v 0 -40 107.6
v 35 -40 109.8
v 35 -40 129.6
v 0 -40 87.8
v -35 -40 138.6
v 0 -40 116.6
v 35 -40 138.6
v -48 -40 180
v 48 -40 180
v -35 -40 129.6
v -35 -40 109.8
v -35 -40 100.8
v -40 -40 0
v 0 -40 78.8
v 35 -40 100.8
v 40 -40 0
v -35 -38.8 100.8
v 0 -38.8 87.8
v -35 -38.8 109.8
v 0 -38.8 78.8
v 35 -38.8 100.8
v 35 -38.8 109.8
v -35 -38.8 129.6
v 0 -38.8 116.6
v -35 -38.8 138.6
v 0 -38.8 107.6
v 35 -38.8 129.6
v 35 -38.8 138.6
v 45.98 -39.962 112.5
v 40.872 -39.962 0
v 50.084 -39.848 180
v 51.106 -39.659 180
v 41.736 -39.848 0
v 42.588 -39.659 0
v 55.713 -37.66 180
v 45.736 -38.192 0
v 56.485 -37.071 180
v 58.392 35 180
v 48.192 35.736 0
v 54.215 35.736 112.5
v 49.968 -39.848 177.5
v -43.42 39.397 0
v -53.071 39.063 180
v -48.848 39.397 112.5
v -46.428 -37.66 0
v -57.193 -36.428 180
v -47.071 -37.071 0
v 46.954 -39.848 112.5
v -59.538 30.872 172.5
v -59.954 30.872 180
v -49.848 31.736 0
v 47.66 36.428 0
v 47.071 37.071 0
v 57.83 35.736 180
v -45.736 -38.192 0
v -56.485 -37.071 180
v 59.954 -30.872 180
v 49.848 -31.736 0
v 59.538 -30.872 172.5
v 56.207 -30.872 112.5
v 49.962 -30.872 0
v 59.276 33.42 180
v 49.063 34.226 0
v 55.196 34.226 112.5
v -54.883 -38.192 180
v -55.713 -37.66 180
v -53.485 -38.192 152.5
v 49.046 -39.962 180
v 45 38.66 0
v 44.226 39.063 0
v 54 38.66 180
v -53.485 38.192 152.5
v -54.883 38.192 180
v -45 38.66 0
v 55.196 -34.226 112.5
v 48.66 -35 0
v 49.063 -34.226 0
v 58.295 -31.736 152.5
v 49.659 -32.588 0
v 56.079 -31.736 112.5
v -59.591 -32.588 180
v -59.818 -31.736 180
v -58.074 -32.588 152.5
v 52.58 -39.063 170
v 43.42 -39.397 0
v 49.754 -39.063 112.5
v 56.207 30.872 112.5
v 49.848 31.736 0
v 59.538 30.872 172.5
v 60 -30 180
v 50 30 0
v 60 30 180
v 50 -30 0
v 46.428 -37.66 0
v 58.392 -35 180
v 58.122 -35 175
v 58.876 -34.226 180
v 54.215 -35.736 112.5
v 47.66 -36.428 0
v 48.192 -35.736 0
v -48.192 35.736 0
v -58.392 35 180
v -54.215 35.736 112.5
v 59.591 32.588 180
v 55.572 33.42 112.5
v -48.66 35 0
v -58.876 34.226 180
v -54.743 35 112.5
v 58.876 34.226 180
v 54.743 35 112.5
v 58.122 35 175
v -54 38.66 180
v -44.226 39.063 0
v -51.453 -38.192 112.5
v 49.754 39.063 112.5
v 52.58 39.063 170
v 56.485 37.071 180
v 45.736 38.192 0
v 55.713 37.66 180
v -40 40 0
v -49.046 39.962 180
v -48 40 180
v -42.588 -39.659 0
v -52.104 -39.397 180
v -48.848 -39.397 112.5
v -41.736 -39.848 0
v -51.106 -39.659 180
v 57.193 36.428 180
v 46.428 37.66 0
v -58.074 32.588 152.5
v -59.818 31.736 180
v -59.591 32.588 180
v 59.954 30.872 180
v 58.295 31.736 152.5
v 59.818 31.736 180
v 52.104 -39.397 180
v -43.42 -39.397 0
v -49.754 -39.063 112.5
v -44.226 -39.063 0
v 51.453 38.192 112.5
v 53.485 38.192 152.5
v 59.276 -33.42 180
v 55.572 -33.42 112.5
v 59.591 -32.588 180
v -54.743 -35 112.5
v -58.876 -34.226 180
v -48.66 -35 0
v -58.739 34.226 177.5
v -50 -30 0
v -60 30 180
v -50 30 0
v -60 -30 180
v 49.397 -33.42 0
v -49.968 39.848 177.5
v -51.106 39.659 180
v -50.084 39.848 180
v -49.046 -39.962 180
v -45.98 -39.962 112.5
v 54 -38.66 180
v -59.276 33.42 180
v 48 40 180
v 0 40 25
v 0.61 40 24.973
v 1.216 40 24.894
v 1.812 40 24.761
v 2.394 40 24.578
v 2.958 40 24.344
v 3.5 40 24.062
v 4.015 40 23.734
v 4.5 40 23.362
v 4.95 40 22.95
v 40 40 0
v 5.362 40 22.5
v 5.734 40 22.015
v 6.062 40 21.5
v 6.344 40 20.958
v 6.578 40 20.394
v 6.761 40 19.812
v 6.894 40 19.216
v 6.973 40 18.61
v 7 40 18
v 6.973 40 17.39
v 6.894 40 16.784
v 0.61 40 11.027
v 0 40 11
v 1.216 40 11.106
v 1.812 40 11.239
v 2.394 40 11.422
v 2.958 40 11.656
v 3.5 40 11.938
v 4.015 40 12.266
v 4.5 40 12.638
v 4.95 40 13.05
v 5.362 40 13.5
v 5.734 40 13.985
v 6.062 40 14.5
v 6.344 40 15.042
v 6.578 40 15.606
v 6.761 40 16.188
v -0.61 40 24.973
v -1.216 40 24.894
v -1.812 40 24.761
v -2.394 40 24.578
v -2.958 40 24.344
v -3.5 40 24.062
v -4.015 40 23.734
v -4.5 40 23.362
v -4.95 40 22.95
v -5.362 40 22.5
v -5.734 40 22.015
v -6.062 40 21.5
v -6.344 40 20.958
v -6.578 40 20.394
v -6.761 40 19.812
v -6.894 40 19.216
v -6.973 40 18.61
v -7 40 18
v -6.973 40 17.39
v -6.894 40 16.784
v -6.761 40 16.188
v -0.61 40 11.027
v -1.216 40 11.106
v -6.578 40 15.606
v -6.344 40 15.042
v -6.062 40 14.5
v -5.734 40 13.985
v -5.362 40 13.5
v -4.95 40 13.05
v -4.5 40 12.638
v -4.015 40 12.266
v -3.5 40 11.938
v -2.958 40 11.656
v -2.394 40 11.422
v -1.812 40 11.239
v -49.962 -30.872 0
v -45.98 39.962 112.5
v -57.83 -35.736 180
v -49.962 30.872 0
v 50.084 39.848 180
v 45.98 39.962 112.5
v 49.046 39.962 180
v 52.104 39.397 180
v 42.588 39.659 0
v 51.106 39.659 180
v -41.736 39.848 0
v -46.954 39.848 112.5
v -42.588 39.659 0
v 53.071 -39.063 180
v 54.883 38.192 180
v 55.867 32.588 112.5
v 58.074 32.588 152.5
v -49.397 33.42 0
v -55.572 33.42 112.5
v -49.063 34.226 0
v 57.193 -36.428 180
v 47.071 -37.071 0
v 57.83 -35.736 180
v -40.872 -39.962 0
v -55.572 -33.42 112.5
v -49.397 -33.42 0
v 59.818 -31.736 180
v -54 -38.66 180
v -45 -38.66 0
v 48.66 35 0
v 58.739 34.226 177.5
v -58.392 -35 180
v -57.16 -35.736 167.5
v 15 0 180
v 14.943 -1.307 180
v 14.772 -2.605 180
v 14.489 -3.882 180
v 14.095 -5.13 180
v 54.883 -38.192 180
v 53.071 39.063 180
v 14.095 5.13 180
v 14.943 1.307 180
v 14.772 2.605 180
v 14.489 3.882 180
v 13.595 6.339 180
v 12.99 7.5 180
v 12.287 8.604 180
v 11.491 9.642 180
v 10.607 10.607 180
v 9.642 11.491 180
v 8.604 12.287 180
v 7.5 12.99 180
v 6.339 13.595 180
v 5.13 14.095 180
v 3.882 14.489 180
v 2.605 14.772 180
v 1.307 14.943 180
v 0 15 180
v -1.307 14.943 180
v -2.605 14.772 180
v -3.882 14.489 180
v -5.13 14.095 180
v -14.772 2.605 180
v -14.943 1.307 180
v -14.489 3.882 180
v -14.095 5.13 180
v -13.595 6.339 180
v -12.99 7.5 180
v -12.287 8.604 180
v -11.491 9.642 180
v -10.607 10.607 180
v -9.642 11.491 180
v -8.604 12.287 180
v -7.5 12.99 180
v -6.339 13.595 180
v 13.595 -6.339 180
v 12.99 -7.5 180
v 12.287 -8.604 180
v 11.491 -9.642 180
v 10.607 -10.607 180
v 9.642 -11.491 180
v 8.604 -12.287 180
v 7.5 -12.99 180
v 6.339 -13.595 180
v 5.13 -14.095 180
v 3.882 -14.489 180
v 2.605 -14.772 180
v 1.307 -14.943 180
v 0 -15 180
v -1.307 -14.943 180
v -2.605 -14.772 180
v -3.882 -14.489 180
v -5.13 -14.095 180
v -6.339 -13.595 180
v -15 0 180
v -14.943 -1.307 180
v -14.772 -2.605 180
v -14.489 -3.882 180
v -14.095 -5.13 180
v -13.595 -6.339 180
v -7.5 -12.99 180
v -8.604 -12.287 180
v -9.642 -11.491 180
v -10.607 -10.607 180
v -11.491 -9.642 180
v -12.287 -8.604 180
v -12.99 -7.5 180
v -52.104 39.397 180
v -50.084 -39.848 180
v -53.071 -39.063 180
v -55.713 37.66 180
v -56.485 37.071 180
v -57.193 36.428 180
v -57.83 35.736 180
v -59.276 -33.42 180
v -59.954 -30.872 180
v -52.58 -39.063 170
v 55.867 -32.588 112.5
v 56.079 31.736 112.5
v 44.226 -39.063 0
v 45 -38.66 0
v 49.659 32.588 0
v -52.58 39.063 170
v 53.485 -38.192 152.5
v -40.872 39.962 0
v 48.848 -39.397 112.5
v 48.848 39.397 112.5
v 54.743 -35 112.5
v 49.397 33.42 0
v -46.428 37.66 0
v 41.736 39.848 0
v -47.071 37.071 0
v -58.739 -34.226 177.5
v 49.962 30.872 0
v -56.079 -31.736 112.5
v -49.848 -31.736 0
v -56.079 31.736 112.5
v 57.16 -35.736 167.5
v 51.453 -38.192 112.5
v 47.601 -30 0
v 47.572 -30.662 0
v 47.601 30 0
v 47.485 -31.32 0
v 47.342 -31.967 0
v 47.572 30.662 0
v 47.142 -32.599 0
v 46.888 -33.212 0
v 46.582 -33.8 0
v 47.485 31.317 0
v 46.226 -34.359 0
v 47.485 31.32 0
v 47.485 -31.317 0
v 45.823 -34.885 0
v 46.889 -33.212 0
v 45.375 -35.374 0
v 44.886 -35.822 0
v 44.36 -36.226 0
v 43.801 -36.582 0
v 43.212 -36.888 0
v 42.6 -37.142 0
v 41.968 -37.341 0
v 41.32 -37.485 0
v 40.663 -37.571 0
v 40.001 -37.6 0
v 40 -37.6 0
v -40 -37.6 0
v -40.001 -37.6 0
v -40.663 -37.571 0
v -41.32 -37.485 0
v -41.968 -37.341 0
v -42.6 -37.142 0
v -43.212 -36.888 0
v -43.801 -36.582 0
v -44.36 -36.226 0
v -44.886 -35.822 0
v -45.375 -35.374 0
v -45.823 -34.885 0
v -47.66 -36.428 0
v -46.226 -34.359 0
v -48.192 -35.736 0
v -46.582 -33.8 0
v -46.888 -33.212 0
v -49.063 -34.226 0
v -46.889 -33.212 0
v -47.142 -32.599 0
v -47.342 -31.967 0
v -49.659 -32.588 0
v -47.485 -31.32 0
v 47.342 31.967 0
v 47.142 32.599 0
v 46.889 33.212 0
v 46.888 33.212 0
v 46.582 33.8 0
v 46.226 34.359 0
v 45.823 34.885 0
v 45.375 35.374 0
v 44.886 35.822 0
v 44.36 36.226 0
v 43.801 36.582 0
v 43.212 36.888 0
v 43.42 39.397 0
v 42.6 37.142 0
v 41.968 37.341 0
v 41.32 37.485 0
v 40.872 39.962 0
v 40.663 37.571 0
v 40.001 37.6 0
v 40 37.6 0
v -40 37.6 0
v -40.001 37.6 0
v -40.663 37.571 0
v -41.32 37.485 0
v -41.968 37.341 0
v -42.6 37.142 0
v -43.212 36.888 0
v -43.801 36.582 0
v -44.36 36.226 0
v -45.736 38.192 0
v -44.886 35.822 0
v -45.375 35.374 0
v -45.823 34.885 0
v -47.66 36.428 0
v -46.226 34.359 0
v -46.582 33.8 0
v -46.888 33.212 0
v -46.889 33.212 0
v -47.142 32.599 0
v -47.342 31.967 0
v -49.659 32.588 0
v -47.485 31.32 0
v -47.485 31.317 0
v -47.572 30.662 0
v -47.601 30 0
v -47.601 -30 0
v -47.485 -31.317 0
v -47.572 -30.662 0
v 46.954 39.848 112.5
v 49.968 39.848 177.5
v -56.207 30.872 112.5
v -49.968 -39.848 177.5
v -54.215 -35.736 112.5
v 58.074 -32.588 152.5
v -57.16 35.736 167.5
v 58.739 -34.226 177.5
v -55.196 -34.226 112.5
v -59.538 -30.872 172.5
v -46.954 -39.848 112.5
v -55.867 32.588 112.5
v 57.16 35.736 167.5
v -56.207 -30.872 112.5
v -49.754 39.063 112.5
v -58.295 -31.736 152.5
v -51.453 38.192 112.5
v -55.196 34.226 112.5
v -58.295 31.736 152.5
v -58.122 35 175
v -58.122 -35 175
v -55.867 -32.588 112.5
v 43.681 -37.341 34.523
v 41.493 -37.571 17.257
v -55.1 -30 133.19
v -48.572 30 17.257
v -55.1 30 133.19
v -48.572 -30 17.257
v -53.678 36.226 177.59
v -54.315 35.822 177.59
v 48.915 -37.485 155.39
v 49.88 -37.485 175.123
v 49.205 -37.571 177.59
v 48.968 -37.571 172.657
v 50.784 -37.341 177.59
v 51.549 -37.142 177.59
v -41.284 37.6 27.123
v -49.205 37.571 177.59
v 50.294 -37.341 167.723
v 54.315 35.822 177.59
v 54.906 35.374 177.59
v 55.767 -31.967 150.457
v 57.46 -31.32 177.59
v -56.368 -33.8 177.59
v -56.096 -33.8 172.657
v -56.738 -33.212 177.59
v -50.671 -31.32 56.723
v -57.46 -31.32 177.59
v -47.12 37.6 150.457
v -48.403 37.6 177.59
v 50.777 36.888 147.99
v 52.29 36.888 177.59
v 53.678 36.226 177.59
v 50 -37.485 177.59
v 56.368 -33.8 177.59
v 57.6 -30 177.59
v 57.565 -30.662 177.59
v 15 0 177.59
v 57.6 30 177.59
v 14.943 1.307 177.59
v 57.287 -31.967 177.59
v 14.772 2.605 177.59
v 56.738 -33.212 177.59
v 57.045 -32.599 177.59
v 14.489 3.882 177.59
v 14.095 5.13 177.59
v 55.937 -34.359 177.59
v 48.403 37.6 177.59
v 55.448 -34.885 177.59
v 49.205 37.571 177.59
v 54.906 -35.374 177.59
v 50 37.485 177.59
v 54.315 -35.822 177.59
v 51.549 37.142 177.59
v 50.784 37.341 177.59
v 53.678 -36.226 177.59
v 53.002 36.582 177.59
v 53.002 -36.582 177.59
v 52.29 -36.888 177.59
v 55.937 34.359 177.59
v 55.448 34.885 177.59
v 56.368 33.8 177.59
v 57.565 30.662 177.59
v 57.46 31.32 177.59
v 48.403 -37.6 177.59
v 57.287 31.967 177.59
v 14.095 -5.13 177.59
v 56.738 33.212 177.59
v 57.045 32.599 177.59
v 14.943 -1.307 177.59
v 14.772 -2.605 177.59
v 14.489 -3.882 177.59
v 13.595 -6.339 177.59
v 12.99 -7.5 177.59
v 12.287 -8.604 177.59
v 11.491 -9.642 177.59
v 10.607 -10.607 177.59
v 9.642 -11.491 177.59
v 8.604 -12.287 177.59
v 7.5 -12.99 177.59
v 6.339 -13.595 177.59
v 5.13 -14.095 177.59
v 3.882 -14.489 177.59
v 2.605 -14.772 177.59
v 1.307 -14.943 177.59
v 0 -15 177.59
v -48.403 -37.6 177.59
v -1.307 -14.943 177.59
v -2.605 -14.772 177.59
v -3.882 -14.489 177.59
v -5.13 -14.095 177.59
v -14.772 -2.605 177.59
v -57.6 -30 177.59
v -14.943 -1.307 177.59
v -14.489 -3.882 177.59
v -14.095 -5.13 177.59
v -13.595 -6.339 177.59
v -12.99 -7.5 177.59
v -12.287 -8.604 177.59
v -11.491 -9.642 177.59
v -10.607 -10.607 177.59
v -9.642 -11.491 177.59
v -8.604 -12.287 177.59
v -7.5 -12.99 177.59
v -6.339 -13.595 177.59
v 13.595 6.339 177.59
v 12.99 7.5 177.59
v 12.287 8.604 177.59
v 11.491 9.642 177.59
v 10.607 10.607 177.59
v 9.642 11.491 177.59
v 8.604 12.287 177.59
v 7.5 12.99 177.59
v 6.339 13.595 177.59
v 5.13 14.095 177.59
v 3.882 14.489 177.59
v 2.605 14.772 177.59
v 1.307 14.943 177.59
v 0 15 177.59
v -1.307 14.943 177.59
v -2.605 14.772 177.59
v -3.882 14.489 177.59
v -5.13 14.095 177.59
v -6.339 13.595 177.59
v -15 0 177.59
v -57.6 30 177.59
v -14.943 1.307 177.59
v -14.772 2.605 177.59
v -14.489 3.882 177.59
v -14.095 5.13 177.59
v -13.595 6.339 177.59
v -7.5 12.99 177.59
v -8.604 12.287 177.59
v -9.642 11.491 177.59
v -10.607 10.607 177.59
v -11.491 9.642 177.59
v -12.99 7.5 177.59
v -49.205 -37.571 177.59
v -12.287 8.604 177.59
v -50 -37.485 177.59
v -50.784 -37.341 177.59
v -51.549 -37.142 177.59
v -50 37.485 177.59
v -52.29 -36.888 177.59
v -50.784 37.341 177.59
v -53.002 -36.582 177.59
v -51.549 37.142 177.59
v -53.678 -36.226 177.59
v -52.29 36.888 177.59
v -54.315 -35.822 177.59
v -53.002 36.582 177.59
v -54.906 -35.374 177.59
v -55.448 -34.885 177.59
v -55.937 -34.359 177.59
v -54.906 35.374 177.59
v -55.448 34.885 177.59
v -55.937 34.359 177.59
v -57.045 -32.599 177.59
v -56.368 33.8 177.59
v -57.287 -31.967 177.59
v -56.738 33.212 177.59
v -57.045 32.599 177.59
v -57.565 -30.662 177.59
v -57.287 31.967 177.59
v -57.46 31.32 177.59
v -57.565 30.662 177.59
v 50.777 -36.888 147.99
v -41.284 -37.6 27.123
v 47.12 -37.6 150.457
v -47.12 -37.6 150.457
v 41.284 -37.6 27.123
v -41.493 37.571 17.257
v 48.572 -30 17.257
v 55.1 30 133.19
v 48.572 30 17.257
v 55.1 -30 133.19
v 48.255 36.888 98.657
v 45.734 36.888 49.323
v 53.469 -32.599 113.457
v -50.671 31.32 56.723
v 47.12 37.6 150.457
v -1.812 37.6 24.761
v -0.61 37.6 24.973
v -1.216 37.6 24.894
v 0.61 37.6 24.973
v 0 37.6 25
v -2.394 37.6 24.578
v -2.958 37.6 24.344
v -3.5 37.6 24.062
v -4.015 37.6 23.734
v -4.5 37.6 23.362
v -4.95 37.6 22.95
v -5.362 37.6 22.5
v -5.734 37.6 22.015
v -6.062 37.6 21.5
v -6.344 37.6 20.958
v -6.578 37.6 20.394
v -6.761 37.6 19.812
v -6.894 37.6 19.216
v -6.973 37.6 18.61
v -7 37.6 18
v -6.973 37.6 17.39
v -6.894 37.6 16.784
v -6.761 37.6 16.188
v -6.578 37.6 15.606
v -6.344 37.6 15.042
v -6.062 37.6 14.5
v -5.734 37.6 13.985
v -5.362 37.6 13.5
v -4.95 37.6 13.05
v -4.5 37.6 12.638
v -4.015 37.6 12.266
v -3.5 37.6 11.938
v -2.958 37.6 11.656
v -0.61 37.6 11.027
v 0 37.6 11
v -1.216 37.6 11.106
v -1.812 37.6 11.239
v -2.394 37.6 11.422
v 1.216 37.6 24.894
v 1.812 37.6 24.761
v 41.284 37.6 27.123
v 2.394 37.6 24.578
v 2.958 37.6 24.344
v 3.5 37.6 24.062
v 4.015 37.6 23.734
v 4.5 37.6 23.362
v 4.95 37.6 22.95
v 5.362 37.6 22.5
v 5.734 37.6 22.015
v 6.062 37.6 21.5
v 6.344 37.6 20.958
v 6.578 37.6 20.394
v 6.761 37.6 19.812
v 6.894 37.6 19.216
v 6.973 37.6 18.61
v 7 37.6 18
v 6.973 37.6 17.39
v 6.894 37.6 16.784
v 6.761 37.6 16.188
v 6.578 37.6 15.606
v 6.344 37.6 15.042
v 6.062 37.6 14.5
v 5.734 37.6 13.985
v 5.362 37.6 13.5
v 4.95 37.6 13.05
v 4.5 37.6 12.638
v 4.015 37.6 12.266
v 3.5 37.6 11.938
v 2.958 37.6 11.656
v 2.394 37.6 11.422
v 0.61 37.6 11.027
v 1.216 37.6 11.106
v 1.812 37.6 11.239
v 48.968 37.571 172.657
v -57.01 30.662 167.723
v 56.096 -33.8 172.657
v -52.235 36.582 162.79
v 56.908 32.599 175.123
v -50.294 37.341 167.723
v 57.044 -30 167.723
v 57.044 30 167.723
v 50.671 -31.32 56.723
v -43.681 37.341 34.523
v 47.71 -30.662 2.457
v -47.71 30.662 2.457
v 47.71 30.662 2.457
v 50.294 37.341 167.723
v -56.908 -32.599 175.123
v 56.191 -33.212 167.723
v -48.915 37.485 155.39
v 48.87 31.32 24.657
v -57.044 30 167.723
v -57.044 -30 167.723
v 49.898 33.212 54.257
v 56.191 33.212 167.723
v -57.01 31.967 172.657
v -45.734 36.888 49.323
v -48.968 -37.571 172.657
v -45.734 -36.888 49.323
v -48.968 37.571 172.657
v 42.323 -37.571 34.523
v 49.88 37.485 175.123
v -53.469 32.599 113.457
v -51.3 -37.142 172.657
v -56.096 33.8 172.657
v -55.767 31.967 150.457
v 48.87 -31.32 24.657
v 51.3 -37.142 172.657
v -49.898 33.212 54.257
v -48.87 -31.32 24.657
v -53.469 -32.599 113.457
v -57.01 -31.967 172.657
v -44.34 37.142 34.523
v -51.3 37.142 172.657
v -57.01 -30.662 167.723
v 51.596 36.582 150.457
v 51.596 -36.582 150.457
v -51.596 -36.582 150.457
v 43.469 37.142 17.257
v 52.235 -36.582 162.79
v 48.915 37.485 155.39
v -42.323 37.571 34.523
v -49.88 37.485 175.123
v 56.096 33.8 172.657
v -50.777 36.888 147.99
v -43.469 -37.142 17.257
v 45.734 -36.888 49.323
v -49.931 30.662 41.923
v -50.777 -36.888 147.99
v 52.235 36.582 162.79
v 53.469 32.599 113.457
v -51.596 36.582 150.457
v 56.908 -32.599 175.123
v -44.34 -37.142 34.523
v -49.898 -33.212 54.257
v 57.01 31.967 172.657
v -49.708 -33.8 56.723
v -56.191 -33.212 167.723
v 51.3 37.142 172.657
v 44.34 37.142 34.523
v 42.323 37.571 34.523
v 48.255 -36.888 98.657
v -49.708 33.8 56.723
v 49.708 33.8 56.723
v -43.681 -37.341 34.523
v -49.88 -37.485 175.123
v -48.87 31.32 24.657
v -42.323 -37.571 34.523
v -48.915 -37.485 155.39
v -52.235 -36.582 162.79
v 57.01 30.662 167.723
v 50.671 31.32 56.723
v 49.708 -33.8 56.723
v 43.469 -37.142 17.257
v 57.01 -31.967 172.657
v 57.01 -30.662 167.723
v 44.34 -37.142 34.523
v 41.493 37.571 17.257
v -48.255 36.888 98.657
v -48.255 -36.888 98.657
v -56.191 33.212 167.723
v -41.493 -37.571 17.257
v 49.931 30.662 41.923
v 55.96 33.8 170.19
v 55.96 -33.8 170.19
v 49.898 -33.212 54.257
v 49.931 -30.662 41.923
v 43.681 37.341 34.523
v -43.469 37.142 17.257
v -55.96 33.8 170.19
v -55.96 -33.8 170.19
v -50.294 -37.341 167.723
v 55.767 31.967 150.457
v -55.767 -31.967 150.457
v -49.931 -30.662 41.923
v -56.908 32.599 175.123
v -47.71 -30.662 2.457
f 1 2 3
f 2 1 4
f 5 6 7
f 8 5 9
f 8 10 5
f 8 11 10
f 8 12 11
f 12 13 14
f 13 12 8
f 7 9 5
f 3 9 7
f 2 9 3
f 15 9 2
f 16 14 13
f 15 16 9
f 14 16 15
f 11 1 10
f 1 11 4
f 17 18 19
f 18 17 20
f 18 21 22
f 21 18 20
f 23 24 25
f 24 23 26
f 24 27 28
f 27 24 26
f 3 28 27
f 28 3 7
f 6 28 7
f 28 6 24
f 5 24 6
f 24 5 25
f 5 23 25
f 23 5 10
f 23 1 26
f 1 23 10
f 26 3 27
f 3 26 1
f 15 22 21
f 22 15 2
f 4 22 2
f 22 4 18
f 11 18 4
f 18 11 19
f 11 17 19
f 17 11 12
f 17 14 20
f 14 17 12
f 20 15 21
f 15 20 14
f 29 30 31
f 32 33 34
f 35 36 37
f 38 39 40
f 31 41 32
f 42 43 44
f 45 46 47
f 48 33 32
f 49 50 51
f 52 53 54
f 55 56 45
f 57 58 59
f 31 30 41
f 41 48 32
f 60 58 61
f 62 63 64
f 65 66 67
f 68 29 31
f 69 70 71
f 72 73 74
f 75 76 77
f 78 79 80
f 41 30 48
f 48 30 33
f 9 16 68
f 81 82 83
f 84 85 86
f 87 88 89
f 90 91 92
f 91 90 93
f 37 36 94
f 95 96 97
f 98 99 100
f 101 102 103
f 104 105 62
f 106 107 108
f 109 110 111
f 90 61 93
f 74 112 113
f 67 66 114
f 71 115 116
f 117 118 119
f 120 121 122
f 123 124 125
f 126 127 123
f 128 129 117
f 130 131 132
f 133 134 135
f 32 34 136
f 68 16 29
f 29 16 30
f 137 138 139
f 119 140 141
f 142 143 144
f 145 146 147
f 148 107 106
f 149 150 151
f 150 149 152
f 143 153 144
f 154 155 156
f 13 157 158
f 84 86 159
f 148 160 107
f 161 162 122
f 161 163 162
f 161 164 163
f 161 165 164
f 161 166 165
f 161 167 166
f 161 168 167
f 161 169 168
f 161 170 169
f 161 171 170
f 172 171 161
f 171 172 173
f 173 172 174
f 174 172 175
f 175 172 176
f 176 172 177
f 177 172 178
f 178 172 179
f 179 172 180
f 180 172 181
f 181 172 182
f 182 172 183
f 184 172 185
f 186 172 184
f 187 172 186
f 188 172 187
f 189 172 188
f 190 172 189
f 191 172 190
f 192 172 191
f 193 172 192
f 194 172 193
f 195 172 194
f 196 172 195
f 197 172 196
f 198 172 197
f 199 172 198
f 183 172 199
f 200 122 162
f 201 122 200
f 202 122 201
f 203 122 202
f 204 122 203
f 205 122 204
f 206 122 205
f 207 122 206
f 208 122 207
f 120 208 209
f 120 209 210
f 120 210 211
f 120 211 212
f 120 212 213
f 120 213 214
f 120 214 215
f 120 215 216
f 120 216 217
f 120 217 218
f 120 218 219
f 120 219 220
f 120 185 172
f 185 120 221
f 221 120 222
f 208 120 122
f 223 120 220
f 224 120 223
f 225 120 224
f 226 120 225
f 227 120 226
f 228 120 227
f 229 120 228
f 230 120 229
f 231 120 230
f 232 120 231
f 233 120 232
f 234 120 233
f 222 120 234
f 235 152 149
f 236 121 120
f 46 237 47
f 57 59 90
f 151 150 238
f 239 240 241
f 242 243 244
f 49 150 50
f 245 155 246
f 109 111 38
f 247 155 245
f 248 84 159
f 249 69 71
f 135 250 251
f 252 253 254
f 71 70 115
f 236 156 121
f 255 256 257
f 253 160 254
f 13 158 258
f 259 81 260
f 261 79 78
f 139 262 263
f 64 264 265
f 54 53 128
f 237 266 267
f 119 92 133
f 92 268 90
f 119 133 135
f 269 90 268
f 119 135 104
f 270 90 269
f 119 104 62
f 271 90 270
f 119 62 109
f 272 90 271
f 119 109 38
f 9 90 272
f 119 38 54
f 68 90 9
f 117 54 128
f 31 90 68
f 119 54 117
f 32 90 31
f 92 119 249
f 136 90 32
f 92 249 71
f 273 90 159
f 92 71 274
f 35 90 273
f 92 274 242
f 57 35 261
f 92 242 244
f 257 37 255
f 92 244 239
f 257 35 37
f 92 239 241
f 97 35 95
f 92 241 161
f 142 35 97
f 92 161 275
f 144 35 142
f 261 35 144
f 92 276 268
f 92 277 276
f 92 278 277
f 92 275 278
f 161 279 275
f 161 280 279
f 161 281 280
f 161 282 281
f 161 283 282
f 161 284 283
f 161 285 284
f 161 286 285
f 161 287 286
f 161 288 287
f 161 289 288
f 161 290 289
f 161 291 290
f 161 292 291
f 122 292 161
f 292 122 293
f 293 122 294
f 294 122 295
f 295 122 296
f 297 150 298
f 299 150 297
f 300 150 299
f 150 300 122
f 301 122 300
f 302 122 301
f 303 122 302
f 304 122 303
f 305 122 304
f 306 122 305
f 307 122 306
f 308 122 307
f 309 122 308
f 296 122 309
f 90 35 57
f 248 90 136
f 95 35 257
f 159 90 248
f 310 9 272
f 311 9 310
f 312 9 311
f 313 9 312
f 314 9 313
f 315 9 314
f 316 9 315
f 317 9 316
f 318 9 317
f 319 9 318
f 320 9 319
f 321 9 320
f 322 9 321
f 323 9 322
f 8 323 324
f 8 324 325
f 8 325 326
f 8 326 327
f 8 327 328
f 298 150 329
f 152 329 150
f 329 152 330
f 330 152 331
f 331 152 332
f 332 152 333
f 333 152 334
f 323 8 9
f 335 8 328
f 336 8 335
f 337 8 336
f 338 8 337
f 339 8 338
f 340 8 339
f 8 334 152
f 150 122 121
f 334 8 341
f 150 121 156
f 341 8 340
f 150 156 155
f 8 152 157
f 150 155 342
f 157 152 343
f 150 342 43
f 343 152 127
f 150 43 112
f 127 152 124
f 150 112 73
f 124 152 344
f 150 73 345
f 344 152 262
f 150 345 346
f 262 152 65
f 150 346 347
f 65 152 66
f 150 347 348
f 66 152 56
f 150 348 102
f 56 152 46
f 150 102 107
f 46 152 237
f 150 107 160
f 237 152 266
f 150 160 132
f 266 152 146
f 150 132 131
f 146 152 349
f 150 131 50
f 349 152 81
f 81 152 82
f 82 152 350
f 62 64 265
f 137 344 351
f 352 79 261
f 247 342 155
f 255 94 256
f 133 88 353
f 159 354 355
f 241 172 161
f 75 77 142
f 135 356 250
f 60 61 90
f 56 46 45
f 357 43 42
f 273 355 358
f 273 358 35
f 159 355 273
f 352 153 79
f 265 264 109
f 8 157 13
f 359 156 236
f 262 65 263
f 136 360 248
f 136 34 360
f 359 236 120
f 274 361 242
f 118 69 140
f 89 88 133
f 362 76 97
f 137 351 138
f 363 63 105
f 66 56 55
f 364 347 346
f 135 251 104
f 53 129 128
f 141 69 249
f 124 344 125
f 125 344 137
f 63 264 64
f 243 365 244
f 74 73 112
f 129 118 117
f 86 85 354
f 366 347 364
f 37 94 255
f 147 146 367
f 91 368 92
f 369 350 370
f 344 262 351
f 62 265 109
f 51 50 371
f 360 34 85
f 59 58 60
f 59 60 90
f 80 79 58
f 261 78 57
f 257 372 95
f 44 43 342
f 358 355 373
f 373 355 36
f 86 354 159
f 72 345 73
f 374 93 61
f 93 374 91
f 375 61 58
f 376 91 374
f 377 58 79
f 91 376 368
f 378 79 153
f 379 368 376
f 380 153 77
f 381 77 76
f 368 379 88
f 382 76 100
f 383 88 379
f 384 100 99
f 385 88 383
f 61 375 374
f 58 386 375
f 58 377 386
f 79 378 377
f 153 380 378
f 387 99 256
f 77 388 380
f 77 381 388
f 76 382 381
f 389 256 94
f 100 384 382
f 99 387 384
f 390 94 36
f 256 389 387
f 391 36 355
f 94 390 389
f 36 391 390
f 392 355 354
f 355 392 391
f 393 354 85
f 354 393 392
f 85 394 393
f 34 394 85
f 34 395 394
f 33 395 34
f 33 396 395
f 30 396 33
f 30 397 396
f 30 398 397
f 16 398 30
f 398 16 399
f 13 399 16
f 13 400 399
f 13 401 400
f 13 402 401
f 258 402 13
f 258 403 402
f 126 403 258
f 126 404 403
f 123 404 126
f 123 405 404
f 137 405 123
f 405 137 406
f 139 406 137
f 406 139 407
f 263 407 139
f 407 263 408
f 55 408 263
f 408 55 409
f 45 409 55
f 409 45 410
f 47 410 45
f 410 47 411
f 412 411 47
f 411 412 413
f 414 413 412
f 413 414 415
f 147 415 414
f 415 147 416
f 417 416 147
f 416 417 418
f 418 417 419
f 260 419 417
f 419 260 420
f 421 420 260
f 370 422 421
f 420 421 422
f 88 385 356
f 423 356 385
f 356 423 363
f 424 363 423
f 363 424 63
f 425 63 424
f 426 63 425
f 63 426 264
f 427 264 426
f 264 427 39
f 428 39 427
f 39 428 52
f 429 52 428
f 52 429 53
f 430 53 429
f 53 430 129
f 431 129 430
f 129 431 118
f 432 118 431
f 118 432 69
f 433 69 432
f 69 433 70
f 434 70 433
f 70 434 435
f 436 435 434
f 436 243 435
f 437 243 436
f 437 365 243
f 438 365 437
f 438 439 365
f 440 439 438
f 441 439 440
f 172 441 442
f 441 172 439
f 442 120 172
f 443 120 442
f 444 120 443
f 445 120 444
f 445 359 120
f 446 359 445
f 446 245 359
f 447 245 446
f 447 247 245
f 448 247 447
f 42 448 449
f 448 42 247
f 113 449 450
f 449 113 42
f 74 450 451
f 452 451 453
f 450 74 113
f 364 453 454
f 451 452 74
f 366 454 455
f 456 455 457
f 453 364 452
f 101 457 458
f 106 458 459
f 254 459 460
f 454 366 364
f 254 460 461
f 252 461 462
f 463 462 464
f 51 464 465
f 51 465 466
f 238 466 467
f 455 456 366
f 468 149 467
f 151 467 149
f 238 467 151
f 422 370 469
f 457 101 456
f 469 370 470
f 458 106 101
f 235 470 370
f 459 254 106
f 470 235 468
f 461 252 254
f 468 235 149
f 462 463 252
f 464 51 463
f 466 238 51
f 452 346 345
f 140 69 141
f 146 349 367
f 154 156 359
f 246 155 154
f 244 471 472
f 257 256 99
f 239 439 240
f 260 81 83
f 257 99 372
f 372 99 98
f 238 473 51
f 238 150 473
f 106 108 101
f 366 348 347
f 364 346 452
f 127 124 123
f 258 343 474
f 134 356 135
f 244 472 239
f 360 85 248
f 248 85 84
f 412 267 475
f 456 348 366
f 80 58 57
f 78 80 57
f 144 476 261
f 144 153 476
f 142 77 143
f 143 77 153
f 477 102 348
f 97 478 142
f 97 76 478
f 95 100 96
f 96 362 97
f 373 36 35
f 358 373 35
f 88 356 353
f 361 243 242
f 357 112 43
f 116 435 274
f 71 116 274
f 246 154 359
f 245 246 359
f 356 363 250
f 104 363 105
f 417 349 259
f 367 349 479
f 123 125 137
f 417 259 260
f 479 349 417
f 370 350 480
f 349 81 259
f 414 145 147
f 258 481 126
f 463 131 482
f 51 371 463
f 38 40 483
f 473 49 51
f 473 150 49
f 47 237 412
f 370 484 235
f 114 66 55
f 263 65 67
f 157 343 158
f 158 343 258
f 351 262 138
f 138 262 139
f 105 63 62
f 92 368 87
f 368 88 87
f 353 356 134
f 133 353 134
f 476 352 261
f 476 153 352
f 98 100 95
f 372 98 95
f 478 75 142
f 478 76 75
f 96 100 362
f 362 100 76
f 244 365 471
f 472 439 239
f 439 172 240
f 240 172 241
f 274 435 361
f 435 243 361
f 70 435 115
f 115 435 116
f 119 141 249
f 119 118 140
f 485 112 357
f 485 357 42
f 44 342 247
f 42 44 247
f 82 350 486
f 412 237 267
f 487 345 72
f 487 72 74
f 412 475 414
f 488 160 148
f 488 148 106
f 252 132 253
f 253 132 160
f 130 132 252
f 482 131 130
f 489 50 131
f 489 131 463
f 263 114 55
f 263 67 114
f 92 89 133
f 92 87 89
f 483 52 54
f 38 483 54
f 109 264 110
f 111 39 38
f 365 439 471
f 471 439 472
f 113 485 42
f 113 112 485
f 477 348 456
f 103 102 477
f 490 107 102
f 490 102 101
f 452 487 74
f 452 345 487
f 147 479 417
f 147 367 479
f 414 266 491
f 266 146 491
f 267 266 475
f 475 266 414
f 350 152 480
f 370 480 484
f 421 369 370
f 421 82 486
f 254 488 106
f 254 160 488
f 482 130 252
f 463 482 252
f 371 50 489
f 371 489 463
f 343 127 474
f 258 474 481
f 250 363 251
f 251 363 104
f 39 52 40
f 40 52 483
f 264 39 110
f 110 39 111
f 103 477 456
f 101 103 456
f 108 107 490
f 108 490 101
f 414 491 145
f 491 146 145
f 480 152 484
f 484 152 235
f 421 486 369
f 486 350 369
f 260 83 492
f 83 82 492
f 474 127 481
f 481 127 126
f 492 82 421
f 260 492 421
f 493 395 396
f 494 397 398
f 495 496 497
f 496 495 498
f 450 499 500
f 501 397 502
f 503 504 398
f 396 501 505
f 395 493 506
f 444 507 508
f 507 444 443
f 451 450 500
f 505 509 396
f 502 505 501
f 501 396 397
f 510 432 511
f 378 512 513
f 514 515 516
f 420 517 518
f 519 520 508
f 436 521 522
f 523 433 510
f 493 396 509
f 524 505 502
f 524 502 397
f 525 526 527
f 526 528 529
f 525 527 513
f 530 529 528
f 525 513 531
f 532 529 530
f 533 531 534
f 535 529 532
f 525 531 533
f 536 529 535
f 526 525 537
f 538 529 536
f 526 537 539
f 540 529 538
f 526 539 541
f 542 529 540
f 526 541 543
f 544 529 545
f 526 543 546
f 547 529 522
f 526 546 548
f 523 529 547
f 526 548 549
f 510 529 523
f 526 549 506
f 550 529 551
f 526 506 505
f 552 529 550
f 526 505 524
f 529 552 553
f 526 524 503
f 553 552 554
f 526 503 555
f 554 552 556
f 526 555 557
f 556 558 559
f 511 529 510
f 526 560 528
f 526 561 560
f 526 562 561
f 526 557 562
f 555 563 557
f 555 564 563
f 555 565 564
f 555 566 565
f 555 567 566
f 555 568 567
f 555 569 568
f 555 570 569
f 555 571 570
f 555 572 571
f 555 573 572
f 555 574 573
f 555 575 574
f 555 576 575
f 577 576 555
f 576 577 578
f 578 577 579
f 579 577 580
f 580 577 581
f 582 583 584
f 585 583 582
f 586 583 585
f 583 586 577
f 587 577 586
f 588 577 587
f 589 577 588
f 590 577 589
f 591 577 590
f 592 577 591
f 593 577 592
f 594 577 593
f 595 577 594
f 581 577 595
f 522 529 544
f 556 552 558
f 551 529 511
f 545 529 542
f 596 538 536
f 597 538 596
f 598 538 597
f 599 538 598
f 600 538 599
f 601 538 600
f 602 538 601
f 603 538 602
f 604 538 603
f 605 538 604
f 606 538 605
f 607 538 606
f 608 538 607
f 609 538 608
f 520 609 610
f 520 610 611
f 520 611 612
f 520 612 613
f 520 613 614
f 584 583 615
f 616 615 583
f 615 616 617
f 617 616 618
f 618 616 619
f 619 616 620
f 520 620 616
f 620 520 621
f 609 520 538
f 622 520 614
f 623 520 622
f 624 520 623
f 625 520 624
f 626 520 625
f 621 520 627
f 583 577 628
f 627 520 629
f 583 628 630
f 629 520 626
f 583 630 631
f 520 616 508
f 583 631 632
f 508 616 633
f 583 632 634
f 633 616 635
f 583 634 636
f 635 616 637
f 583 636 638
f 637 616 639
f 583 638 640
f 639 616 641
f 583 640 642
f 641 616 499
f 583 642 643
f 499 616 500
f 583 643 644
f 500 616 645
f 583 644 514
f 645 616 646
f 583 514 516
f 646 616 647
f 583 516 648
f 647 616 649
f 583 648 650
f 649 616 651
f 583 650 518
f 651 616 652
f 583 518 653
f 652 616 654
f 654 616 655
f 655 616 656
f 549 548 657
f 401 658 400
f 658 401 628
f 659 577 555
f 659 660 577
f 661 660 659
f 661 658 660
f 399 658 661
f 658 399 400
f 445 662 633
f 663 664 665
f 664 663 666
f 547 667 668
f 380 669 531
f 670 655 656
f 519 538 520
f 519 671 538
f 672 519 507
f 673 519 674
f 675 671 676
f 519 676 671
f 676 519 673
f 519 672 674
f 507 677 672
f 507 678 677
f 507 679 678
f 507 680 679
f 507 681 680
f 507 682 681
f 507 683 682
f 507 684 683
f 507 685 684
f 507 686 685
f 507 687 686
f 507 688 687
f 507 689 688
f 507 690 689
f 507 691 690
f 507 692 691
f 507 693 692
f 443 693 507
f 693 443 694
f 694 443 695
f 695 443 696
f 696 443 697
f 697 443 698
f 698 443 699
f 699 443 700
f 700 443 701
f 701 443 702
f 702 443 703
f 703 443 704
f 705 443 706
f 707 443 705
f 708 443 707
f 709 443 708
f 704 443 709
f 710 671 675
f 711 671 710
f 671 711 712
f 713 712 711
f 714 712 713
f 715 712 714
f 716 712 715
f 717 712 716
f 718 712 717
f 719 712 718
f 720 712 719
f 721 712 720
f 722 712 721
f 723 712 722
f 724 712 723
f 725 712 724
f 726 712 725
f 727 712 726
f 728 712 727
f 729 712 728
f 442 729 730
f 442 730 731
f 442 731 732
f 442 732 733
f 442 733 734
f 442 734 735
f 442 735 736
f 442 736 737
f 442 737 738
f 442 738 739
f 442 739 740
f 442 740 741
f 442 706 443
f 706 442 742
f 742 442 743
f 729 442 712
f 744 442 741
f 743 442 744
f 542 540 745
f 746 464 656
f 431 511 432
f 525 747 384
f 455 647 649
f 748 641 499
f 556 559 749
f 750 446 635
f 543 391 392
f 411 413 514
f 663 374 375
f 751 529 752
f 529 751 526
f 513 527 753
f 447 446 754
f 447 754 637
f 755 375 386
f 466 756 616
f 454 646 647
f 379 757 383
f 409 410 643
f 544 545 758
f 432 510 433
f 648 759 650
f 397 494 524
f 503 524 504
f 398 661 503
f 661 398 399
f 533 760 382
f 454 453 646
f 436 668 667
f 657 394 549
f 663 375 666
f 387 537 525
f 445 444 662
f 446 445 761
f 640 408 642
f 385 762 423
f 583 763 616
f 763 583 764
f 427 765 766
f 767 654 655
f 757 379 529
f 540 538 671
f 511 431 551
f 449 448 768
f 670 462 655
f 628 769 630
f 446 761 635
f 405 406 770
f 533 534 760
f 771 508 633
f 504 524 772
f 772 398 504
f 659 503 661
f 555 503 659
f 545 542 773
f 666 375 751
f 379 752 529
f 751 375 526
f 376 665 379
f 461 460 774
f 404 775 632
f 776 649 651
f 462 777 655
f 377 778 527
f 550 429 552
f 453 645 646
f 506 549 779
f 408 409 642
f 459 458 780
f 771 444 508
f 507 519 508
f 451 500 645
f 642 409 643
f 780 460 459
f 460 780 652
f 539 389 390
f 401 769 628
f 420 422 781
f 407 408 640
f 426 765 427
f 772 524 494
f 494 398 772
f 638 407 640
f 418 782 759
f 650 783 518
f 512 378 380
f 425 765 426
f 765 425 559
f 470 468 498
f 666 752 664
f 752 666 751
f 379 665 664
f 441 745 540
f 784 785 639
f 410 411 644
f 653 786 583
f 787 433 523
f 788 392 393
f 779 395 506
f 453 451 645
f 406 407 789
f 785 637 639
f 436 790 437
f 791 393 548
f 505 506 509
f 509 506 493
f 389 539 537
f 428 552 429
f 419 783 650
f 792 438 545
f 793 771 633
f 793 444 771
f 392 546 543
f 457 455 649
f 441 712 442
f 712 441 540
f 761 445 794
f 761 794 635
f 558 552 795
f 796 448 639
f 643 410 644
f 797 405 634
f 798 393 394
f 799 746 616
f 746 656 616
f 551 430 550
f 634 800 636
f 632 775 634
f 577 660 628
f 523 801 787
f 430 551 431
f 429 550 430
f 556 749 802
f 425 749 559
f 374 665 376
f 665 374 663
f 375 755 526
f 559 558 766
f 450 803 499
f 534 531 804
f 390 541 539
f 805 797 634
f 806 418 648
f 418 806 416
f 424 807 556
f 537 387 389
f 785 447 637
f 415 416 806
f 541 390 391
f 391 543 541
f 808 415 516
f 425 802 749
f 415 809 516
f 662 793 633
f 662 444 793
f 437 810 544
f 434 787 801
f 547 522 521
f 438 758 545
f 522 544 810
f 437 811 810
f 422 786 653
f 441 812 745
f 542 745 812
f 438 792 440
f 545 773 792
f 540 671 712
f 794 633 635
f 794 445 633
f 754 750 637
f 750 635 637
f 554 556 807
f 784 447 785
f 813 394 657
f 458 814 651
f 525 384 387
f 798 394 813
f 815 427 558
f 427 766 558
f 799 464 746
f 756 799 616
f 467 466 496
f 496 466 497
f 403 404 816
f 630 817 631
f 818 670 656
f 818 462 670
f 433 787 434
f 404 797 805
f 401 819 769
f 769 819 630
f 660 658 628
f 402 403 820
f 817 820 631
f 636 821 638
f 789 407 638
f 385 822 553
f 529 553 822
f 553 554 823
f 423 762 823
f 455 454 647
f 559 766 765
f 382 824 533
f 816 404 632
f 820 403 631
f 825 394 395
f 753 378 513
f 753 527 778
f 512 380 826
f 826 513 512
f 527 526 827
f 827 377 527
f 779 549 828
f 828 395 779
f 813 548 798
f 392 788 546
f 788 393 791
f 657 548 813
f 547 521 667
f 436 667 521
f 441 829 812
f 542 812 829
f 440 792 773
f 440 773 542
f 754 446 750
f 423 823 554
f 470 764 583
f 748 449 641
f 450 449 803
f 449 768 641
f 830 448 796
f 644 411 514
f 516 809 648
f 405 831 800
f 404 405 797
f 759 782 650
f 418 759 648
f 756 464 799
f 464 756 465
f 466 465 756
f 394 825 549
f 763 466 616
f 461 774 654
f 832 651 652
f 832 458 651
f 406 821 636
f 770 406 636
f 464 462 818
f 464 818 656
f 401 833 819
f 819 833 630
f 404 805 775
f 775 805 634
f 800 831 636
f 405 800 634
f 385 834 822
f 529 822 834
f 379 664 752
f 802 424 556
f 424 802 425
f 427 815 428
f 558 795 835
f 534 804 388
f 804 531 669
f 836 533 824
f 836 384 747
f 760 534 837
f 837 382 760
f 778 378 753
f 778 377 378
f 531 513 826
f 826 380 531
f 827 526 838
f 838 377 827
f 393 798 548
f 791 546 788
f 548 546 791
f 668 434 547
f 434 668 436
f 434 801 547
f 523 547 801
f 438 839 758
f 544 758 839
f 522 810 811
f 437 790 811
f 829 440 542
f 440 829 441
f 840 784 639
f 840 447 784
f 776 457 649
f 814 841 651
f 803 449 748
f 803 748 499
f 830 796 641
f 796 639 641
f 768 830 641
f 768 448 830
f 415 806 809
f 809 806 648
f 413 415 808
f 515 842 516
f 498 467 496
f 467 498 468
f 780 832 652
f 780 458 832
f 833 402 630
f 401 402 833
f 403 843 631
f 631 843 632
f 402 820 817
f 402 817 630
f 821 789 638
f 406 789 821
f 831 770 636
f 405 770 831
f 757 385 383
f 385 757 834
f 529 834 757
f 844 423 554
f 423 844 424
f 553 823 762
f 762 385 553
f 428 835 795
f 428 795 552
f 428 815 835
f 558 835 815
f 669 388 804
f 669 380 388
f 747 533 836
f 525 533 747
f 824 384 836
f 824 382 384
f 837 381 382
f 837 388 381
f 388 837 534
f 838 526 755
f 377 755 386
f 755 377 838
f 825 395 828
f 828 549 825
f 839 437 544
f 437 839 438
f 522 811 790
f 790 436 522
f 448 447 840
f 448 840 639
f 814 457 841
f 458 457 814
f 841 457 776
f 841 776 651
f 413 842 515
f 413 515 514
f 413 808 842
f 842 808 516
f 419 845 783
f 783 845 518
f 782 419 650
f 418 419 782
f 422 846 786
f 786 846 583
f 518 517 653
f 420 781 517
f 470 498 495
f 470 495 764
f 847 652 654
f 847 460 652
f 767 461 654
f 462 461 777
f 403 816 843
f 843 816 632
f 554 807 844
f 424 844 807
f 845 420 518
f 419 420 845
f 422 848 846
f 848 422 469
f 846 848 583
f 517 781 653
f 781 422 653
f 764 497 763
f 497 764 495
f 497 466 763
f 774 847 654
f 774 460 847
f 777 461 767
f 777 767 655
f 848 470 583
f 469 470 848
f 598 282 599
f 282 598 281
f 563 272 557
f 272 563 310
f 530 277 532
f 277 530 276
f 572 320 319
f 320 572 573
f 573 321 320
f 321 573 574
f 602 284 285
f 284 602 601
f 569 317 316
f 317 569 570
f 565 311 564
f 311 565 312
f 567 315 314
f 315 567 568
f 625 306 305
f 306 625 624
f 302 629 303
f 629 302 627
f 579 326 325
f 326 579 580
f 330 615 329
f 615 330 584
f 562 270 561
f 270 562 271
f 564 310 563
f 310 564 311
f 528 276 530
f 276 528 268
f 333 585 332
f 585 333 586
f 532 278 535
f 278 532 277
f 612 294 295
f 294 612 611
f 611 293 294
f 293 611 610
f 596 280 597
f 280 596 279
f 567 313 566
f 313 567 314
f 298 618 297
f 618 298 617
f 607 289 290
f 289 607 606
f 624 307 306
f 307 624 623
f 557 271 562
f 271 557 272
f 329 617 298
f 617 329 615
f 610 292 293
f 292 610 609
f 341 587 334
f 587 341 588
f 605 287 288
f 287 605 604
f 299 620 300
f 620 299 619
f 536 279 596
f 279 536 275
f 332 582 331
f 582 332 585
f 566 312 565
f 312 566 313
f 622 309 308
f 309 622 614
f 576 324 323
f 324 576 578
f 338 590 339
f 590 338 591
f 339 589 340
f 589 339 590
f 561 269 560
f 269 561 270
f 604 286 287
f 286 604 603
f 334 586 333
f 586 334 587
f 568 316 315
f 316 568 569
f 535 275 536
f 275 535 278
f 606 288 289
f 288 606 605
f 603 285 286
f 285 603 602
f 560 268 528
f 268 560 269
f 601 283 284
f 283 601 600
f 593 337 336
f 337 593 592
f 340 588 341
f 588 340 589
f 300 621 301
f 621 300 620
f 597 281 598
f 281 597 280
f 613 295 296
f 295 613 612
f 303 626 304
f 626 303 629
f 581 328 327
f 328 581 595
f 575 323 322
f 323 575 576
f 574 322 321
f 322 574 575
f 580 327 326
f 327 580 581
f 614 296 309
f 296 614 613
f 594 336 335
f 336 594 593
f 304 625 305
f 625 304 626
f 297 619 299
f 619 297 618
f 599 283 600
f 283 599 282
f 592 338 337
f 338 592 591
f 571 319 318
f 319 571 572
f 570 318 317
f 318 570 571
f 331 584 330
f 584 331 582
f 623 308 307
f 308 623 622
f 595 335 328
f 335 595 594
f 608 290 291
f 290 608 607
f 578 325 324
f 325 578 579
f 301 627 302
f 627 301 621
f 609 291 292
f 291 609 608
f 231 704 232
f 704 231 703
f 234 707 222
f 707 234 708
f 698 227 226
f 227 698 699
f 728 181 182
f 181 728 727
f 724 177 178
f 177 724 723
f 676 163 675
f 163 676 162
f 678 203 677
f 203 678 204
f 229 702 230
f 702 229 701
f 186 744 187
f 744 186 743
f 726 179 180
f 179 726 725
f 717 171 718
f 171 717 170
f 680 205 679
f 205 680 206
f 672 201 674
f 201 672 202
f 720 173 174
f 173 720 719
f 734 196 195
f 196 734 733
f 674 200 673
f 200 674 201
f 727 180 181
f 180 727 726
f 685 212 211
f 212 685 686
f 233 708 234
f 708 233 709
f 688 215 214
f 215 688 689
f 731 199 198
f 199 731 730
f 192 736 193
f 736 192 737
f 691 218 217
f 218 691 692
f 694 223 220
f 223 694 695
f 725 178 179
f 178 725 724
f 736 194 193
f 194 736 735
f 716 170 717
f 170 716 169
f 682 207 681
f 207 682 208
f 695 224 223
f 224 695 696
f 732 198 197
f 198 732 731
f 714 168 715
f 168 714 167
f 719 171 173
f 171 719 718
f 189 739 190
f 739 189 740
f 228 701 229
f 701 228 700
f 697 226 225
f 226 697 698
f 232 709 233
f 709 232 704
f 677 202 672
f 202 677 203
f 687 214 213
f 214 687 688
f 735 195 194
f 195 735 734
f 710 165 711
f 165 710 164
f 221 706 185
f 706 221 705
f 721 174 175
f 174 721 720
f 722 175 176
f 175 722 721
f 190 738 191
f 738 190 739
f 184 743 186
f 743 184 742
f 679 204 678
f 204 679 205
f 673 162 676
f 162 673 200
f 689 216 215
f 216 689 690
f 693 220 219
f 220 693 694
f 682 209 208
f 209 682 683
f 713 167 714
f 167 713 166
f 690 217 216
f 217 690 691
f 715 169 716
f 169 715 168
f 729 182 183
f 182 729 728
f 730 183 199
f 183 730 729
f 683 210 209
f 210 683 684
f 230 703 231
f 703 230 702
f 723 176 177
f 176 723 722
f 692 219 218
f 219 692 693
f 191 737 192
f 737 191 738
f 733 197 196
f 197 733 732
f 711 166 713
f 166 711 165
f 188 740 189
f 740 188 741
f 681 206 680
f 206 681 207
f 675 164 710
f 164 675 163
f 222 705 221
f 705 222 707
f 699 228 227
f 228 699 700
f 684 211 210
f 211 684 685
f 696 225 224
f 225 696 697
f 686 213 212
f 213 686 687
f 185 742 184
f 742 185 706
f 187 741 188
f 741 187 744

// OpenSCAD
// Elon Man printed parts. Parametric OpenSCAD.
// Pick a part, press F6, export STL. All sizes in mm.
// Look: tapered red body, two gold chest chevrons, black base, red head with a gray face bezel.

part = "body"; // [body, chevron, base, head, bezel, yoke, all]

$fn = 72;

// ---- body ----
body_w_bottom = 100;   // width at the waist
body_w_top    = 120;   // width at the shoulders
body_d        = 80;    // depth
body_h        = 180;
corner_r      = 10;
wall          = 2.4;
neck_hole_d   = 30;
channel_depth = 1.2;   // chevron channel cut into the front

// ---- head ----
head_w      = 110;
head_h      = 95;
head_d      = 90;
face_d      = 62;      // hole for the round display (1.28in GC9A01 = ~39 mm active, 2.1in board ~ 60 mm)
cam_slot    = [34, 14];
neck_col_d  = 26;

// ---- base ----
base_w = 150; base_d = 110; base_h = 28;

module rounded_rect(w, d, r) {
  offset(r = r) square([w - 2 * r, d - 2 * r], center = true);
}

module body_solid(inset = 0) {
  s = (body_w_top - 2 * inset) / (body_w_bottom - 2 * inset);
  linear_extrude(height = body_h - inset, scale = [s, 1])
    rounded_rect(body_w_bottom - 2 * inset, body_d - 2 * inset, max(1, corner_r - inset));
}

// A chevron (V pointing down) on the front, in the X-Z plane.
module chevron_shape(z, width = 70, thick = 9, drop = 22) {
  polygon([
    [-width / 2, z], [0, z - drop], [width / 2, z],
    [width / 2, z + thick], [0, z - drop + thick], [-width / 2, z + thick]
  ]);
}

module chevron_prism() {
  // extrude toward the front (-Y) from the middle of the body
  rotate([90, 0, 0]) linear_extrude(height = body_d) {
    chevron_shape(body_h * 0.72);
    chevron_shape(body_h * 0.56);
  }
}

module body() {
  difference() {
    body_solid();
    translate([0, 0, -0.01]) body_solid(wall);            // hollow, open bottom for access
    translate([0, 0, body_h - wall - 1]) cylinder(d = neck_hole_d, h = wall + 3);
    // chevron channels: only the outer skin, only where the prism hits it
    intersection() {
      difference() { body_solid(); body_solid(channel_depth); }
      chevron_prism();
    }
    // cable hole at the back bottom
    translate([0, body_d / 2, 18]) rotate([90, 0, 0]) cylinder(d = 14, h = 10, center = true);
  }
}

module chevron() {
  // print flat in gold, glue into the channel. 0.2 mm smaller than the channel all round.
  linear_extrude(height = channel_depth - 0.1) offset(delta = -0.2) chevron_shape(0);
}

module base() {
  difference() {
    linear_extrude(height = base_h) rounded_rect(base_w, base_d, 12);
    translate([0, 0, 2.4]) linear_extrude(height = base_h) rounded_rect(base_w - 4.8, base_d - 4.8, 10);
    // lip the body sits in
    translate([0, 0, base_h - 4]) linear_extrude(height = 5) rounded_rect(body_w_bottom + 0.6, body_d + 0.6, corner_r);
    // power + USB at the back
    translate([0, base_d / 2, base_h / 2]) cube([40, 10, 14], center = true);
  }
}

module head_solid(inset = 0) {
  scale([(head_w - 2 * inset) / head_w, (head_d - 2 * inset) / head_w, (head_h - 2 * inset) / head_w])
    sphere(d = head_w);
}

module head() {
  difference() {
    head_solid();
    head_solid(wall);
    // face hole, front
    translate([0, -head_d / 2, 0]) rotate([90, 0, 0]) cylinder(d = face_d, h = 30, center = true);
    // camera slot, top
    translate([0, -10, head_h / 2 - 4]) cube([cam_slot[0], cam_slot[1], 20], center = true);
    // neck column, bottom
    translate([0, 0, -head_h / 2]) cylinder(d = neck_col_d + 0.6, h = 20, center = true);
    // flat bottom so it prints
    translate([0, 0, -head_h / 2 - 50 + 4]) cube([200, 200, 100], center = true);
  }
}

module bezel() {
  difference() {
    cylinder(d = face_d + 12, h = 3);
    translate([0, 0, -1]) cylinder(d = face_d - 4, h = 5);
  }
  // locating ring that slides into the face hole
  difference() {
    cylinder(d = face_d - 0.4, h = 6);
    translate([0, 0, -1]) cylinder(d = face_d - 4, h = 8);
  }
}

module yoke() {
  // U-yoke on the pan servo horn, holds the neck column. Print in PETG, 4 walls, 40% infill.
  arm_h = 40; gap = 30; t = 5;
  difference() {
    union() {
      cylinder(d = 44, h = t);
      for (x = [-1, 1]) translate([x * (gap / 2 + t / 2), 0, arm_h / 2]) cube([t, 20, arm_h], center = true);
    }
    translate([0, 0, -1]) cylinder(d = 7, h = t + 2);                 // horn screw + spline clearance
    for (a = [0, 90, 180, 270]) rotate(a) translate([8, 0, -1]) cylinder(d = 2.2, h = t + 2); // horn screws
    for (x = [-1, 1]) translate([x * (gap / 2 + t / 2), 0, arm_h - 8]) rotate([0, 90, 0]) cylinder(d = 3.2, h = t + 2, center = true);
  }
}

if (part == "body") body();
if (part == "chevron") chevron();
if (part == "base") base();
if (part == "head") head();
if (part == "bezel") bezel();
if (part == "yoke") yoke();
if (part == "all") {
  color("black") base();
  color("red") translate([0, 0, base_h - 4]) body();
  color("red") translate([0, 0, base_h - 4 + body_h + head_h / 2 + 10]) head();
}
